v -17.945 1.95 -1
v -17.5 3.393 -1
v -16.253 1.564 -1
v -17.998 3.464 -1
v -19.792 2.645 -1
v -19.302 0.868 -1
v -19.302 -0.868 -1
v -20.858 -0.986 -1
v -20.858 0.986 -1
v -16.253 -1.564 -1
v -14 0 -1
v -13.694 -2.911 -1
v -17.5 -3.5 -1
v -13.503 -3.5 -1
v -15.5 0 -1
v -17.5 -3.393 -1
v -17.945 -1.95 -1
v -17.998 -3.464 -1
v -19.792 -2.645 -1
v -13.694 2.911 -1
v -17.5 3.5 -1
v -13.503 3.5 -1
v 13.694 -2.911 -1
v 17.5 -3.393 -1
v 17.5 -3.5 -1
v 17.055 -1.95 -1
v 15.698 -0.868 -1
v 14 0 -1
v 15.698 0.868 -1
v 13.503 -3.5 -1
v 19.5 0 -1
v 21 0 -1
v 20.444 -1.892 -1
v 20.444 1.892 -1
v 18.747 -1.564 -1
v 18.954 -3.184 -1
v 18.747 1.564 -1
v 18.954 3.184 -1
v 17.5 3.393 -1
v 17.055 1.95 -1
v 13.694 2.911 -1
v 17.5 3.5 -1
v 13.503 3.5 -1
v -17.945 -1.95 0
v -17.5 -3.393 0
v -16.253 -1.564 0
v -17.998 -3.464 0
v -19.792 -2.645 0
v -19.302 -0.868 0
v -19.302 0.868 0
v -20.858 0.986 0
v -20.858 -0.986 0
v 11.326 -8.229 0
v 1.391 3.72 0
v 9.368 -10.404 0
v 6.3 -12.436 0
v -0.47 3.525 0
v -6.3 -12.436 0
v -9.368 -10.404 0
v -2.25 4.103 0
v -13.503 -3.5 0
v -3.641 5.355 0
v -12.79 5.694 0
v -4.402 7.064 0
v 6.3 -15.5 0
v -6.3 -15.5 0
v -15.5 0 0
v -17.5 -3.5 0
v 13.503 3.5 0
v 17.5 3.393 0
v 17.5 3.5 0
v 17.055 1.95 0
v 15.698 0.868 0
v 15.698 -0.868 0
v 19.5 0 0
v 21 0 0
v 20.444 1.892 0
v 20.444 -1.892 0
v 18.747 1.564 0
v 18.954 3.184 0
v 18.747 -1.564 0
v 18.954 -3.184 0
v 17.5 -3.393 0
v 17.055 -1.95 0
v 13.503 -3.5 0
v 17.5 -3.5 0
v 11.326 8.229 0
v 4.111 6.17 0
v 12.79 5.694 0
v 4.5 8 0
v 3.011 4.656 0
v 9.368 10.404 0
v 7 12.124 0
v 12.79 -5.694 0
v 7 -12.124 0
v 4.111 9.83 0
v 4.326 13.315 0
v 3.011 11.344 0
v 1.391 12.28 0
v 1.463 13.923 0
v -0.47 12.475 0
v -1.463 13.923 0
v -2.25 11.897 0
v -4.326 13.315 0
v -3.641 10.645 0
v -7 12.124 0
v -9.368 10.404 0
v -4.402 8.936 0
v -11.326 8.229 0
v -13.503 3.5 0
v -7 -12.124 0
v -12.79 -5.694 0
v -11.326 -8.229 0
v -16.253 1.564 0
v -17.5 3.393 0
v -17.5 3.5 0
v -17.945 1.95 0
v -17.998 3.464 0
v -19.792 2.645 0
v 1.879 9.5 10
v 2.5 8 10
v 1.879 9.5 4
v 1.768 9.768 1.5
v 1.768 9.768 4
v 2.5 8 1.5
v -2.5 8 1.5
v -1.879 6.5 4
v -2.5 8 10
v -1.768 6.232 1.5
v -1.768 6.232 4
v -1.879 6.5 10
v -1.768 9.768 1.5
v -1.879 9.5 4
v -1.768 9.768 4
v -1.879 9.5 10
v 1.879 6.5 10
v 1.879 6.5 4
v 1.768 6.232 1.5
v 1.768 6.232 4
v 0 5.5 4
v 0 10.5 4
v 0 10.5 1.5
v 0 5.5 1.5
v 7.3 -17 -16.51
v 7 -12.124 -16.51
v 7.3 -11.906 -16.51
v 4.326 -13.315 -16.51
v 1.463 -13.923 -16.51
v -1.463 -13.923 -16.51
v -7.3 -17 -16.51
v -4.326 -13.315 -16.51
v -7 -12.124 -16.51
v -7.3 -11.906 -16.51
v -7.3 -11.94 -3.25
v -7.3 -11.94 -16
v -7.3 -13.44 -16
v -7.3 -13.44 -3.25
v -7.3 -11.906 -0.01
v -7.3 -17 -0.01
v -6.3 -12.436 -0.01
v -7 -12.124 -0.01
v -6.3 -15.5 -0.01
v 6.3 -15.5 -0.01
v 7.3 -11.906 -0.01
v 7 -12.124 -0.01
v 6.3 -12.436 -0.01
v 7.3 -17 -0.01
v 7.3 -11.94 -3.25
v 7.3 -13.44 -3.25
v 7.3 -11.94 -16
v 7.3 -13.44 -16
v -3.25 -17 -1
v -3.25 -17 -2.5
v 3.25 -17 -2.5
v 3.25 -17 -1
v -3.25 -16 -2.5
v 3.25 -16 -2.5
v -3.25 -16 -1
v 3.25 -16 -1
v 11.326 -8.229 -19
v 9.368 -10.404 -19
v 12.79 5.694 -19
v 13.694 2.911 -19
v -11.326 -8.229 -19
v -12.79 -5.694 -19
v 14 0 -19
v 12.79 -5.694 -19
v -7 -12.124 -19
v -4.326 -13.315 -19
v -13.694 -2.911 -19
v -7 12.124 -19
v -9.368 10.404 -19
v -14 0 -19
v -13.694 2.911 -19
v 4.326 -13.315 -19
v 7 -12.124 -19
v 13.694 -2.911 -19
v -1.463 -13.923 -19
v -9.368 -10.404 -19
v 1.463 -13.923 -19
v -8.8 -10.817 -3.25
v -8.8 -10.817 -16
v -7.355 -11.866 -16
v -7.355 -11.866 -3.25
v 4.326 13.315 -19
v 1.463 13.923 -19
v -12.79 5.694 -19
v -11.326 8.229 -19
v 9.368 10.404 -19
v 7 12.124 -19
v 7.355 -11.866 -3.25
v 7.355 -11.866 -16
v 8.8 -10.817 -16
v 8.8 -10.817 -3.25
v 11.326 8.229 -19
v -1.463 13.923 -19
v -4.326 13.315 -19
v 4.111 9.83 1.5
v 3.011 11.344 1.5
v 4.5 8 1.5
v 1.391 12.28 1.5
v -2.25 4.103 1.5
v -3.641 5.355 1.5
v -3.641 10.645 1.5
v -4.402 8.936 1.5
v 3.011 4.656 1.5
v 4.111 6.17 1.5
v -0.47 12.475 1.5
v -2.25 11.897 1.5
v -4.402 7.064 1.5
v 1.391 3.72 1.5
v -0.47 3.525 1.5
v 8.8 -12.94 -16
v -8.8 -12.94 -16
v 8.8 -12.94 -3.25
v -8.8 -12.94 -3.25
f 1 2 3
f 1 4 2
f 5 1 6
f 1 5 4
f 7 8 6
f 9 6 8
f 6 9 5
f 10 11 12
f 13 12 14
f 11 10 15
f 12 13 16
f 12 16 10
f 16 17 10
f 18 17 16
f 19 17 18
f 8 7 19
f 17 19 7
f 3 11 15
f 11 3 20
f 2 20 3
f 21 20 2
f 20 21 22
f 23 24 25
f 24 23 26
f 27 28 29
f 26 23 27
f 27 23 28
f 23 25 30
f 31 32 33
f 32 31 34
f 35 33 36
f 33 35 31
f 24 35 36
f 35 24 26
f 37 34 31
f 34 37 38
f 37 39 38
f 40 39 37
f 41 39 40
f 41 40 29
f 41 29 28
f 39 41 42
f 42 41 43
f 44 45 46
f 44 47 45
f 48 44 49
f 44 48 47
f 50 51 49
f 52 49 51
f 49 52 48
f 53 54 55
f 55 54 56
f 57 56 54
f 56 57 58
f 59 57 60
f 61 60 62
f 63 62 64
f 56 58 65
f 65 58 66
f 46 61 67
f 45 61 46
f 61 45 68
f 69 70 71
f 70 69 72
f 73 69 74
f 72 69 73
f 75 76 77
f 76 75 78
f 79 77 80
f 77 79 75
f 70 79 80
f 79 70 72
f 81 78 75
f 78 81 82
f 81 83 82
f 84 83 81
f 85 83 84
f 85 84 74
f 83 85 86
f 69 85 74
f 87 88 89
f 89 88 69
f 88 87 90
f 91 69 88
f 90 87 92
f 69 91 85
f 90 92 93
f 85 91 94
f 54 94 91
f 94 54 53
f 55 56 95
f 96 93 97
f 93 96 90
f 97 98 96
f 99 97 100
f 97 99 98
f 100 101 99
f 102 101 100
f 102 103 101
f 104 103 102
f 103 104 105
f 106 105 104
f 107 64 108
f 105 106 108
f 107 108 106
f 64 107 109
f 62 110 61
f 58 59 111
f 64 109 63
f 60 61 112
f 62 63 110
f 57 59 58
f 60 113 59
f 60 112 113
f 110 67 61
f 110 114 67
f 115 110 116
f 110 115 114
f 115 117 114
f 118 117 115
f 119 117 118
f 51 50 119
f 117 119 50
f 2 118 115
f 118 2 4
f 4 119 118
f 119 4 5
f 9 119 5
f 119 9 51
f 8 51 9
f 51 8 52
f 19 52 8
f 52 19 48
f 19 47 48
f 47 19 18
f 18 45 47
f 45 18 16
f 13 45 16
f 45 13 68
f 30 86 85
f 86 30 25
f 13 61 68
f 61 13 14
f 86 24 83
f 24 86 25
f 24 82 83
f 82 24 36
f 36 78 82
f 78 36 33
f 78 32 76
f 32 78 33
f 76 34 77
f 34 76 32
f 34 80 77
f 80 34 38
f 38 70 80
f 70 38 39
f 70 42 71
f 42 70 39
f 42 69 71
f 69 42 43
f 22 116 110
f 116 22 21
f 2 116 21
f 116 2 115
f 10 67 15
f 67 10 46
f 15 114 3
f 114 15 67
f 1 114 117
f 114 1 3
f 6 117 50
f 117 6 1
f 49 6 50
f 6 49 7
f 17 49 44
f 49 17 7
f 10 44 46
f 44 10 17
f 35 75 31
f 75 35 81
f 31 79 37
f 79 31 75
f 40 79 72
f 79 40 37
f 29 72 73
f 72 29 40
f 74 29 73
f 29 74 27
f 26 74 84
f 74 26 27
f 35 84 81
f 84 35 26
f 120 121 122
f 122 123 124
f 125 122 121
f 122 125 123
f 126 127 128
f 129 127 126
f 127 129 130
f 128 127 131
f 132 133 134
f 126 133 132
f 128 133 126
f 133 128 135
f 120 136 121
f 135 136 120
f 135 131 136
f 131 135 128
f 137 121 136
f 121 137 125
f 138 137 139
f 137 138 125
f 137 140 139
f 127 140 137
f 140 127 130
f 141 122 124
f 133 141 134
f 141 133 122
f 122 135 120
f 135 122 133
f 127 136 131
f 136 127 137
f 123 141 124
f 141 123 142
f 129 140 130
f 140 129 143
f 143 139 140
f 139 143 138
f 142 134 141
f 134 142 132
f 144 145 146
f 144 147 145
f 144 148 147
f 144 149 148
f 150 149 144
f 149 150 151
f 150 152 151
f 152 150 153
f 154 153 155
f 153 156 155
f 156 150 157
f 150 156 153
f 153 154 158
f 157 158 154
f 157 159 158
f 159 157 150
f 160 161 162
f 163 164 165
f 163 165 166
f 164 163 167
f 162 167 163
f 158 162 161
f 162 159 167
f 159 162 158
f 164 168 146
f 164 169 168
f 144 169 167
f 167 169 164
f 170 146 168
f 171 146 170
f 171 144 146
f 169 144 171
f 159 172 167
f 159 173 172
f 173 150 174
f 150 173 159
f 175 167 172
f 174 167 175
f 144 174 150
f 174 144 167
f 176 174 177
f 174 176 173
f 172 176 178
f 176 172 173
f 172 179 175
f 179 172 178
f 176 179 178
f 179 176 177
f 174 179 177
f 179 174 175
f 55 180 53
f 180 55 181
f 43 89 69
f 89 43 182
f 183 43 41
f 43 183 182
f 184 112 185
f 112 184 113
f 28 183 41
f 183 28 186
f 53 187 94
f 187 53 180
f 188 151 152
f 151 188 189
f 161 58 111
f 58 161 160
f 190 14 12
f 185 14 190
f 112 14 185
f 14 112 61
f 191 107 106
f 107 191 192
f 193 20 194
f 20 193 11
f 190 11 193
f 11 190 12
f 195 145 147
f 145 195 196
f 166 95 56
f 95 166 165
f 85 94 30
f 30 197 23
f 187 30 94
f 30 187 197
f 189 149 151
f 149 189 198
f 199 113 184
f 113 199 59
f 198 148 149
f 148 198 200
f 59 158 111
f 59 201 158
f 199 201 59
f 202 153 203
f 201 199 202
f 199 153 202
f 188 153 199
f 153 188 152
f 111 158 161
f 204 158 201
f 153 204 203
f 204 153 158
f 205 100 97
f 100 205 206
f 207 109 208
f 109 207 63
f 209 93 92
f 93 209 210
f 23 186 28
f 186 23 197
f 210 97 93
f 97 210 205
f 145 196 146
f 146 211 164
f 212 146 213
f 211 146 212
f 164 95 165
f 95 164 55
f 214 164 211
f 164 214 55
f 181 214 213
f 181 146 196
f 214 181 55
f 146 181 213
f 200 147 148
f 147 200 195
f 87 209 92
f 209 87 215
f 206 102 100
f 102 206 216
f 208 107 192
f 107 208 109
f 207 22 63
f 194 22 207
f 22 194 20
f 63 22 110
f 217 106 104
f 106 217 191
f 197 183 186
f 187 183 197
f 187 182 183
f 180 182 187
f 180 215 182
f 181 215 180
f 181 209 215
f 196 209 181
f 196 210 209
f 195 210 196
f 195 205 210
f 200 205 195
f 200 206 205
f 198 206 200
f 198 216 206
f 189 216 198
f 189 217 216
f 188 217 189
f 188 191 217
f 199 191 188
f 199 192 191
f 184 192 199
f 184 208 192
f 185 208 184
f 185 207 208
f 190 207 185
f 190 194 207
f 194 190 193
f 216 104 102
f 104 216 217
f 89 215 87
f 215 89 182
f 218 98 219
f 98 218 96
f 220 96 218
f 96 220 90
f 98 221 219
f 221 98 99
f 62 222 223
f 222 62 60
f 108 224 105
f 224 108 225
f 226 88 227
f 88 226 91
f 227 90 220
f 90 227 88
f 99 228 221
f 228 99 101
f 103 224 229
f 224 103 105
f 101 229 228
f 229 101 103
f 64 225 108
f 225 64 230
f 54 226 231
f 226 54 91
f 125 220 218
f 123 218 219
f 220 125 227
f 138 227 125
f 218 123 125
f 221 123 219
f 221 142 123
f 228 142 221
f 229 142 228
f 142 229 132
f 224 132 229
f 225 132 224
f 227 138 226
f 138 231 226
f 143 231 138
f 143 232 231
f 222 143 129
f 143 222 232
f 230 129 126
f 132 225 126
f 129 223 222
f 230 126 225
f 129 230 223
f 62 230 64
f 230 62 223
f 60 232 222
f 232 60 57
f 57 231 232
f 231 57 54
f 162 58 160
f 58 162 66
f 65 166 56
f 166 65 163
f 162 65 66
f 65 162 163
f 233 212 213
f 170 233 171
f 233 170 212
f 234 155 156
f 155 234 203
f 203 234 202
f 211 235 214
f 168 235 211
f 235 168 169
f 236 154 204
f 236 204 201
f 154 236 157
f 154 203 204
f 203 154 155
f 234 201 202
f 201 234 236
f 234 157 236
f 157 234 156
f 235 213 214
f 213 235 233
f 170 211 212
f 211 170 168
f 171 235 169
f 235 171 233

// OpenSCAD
//$fa = 1;
//$fs = 0.4;
//$fn = 200;

function stepper2b_pinOffset() = [0, 8, 0];

function stepper2b_pinDiam() = 5;

module stepper2b_pin()
{
	color("#c1a15e")
	{
		linear_extrude(10-6)
		circle(d=5);

		intersection()
		{
			linear_extrude(10)
			circle(d=stepper2b_pinDiam());
			
			translate([0, 0, 10-6+6/2])  cube([10, 3, 6], center=true);
		}
	}
}

module stepper2b_mountingPlate(holes=true)
{
	difference()
	{
		translate([0, 0, -1])
		linear_extrude(1)
		for(i=[-1, 1])
		{
			union()
			{
				translate([35/4*i, 0]) square([35/2, 7], center=true);
				translate([35/2*i, 0]) circle(d=7);
			}
		}
		
		if(holes)
		{
			stepper2b_mountingHole();
		}
	}
}

module stepper2b_mountingHole()
{
	translate([0, 0, -1.01])
	linear_extrude(1.02)
	for(i=[-1, 1])
	{
		translate([35/2*i, 0]) circle(d=4);
	}
}

module stepper2b()
{
	translate([0, 0, -19])
	linear_extrude(19)
	circle(d=28);
	
	stepper2b_mountingPlate();
	
	linear_extrude(1.5)
	translate([0, 8]) circle(d=9);
	
	translate([0, -17/2+1.5/2, -16.5])
	linear_extrude(16.5)
	square([14.6-2, 17-1.5], center=true);
	
	translate(stepper2b_pinOffset())
	rotate([0, 0, $t*360])
	stepper2b_pin();
	
	color("#5399cc")
	difference()
	{
		translate([0, -17/2, -16.5-0.01])
		linear_extrude(16.5)
		square([14.6, 17], center=true);
		
		translate([0, -17, -2.5])
		linear_extrude(1.5)
		square([6.5, 2], center=true);
	}
	
	color("#5399cc")
	translate([0, -17, -16])
	linear_extrude(12.75)
	for(i=[-1, 1])
	{
		translate([i*14.6/2, 5.06])
		scale([i, 1])
		difference()
		{
			polygon([[0,0], [0,-1.5],[1.5,-1], [1.5, 2]]);
		}
	}
}

stepper2b();
